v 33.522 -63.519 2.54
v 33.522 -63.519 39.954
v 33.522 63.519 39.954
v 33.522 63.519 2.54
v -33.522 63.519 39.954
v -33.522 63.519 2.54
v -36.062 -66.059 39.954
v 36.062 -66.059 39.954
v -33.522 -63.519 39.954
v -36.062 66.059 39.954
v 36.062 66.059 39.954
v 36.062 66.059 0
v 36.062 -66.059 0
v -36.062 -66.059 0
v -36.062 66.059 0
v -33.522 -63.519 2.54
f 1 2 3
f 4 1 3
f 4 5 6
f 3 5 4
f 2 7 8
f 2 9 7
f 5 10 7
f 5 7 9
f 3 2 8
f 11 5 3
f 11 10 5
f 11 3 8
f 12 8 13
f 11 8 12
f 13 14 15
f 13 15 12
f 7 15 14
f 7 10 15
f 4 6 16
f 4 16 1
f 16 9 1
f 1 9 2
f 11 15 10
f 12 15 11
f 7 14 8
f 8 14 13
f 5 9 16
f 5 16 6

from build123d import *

# Parameters (mm, degrees)
F0_W      = 110.1217
F0_H      = 132.1181
F1_DEPTH  = 39.9542
F2_W      = 132.1181
F2_H      = 38.6842
F3_DEPTH  = 18.9992
F4_W      = 132.1181
F4_H      = 38.6842
F5_DEPTH  = 18.9992
F6_W      = 18.9992
F6_H      = 132.1181
F7_DEPTH  = 1.271
F8_W      = 18.9992
F8_H      = 132.1181
F9_DEPTH  = 1.271
F10_W     = 67.0433
F10_H     = 127.0381
F11_DEPTH = 37.4142


with BuildPart() as f1:
    # F0 (on Top) → F1 (new body)
    with BuildSketch(Plane.XY):
        Rectangle(F0_W, F0_H)
    extrude(amount=F1_DEPTH)

    # F2 (on face) → F3 (cut)
    with BuildSketch(Plane(origin=(-55.06085, 0, 0), x_dir=(0, -1, 0), z_dir=(-1, 0, 0))):
        with Locations((0, 19.3421)):
            Rectangle(F2_W, F2_H)
    extrude(amount=-F3_DEPTH, mode=Mode.SUBTRACT)

    # F4 (on face) → F5 (cut)
    with BuildSketch(Plane.YZ.offset(55.06085)):
        with Locations((0, 19.3421)):
            Rectangle(F4_W, F4_H)
    extrude(amount=-F5_DEPTH, mode=Mode.SUBTRACT)

    # F6 (on face) → F7 (cut, through all)
    with BuildSketch(Plane(origin=(0, 0, 38.6842), x_dir=(1, 0, 0), z_dir=(0, 0, -1))):
        with Locations((-45.56125, 0)):
            Rectangle(F6_W, F6_H)
    extrude(amount=-F7_DEPTH, mode=Mode.SUBTRACT)

    # F8 (on face) → F9 (cut, through all)
    with BuildSketch(Plane(origin=(0, 0, 38.6842), x_dir=(1, 0, 0), z_dir=(0, 0, -1))):
        with Locations((45.56125, 0)):
            Rectangle(F8_W, F8_H)
    extrude(amount=-F9_DEPTH, mode=Mode.SUBTRACT)

    # F10 (on face) → F11 (cut)
    with BuildSketch(Plane.XY.offset(39.9542)):
        Rectangle(F10_W, F10_H)
    extrude(amount=-F11_DEPTH, mode=Mode.SUBTRACT)


solid = f1.part
